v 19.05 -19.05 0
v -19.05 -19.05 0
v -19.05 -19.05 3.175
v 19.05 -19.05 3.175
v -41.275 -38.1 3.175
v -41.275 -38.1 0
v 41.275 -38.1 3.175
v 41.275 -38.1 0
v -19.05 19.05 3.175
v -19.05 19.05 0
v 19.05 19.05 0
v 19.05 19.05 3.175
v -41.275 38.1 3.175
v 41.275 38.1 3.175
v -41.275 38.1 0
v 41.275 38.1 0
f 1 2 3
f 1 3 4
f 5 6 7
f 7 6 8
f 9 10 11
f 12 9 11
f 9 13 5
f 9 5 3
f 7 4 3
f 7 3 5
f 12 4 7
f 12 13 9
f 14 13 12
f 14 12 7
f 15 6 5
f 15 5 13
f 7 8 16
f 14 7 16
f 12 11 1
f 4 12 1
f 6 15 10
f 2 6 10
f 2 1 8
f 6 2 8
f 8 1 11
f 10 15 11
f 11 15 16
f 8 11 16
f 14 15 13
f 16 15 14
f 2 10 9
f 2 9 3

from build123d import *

# Parameters (mm, degrees)
F0_W     = 82.55
F0_H     = 76.2
F1_DEPTH = 3.175
F2_W     = 38.1
F2_H     = 38.1
F3_DEPTH = 3.175


with BuildPart() as f1:
    # F0 (on Top) → F1 (new body)
    with BuildSketch(Plane.XY):
        Rectangle(F0_W, F0_H)
    extrude(amount=F1_DEPTH)

    # F2 (on face) → F3 (cut)
    with BuildSketch(Plane(origin=(0, 0, 0), x_dir=(1, 0, 0), z_dir=(0, 0, -1))):
        Rectangle(F2_W, F2_H)
    extrude(amount=-F3_DEPTH, mode=Mode.SUBTRACT)


solid = f1.part
